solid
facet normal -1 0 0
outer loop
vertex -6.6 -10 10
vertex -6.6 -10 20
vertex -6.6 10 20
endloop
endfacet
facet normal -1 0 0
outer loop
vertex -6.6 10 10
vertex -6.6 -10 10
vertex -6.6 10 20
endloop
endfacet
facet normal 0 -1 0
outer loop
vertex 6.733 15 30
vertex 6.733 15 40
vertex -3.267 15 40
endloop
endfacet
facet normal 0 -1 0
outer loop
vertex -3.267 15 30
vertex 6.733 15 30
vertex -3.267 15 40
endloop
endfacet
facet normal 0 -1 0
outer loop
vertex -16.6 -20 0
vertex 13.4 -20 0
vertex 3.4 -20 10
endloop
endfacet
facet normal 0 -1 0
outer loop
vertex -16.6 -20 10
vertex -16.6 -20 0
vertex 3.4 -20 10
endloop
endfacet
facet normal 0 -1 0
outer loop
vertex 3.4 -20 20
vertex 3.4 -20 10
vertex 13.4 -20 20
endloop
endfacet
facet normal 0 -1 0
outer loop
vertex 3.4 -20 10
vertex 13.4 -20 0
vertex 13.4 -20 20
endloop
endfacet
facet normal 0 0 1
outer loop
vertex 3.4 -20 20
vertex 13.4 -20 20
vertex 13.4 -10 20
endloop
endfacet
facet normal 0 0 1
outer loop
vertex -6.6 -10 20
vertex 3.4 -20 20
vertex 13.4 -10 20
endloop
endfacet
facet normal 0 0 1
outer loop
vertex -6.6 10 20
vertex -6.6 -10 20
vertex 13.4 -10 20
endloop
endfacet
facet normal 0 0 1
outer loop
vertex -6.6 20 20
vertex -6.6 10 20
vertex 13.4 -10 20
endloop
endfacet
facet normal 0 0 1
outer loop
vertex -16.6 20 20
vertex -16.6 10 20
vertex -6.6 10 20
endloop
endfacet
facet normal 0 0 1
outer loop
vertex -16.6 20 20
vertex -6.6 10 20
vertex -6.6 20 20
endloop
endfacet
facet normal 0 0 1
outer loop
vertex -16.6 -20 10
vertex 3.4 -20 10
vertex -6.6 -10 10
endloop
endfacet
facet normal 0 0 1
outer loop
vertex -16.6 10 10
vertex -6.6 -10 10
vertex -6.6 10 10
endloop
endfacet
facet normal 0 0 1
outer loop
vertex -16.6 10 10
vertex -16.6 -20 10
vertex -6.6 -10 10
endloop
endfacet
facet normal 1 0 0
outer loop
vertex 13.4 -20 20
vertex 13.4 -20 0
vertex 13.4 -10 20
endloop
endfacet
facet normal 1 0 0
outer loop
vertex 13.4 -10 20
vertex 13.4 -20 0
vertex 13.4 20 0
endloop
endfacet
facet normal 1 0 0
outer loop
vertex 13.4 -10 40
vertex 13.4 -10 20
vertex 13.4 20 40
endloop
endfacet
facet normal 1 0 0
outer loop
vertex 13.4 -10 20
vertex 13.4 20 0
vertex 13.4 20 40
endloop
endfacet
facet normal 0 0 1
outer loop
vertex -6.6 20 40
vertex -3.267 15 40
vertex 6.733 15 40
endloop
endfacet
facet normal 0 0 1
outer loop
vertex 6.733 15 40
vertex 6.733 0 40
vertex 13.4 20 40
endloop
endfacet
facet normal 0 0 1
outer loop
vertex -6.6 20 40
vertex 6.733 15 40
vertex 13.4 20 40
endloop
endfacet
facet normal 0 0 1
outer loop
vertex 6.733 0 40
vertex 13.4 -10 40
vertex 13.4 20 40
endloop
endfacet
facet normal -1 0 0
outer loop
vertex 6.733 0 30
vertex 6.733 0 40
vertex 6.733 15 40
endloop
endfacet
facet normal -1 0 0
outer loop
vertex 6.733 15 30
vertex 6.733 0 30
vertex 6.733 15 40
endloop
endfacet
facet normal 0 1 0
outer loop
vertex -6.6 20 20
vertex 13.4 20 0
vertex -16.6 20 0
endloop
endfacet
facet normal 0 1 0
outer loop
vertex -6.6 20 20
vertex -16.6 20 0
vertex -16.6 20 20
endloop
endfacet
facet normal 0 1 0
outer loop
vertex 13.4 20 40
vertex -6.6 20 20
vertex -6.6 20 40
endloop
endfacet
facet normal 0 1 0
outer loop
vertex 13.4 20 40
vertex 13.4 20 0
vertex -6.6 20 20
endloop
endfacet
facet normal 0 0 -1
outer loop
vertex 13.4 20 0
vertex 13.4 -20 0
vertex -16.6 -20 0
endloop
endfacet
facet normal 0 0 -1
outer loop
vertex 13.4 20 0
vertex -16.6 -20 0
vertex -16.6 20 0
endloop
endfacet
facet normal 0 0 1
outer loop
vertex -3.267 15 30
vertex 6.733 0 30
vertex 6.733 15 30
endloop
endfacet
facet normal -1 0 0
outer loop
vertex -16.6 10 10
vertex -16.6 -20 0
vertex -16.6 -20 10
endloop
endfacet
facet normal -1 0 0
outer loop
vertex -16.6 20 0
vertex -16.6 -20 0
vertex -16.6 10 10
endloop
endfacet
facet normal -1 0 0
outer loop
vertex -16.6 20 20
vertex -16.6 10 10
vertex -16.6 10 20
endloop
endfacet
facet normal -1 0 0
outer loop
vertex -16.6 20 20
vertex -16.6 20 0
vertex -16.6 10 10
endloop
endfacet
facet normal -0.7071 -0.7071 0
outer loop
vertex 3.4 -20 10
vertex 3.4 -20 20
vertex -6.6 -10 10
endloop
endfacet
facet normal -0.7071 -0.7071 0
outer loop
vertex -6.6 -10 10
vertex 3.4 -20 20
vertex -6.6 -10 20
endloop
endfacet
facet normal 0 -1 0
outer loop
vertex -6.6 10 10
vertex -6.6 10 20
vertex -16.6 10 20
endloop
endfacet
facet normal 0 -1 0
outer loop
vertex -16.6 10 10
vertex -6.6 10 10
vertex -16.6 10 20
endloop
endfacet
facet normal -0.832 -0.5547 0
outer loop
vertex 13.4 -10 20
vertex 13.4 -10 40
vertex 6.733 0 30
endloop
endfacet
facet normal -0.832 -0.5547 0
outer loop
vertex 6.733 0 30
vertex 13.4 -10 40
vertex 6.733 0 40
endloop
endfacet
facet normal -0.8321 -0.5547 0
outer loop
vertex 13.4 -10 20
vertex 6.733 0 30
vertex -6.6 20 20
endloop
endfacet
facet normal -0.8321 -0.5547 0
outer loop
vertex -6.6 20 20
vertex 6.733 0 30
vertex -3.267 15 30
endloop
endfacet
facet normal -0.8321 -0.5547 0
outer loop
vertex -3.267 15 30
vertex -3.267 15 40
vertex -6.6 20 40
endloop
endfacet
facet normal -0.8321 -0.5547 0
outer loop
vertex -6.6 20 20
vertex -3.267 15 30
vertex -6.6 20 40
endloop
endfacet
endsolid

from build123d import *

# Parameters (mm, degrees)
F0_W     = 40
F0_H     = 40
F1_DEPTH = 30
F3_DEPTH = 20
F5_DEPTH = 10
F7_DEPTH = 10
F8_ANGLE = 90


with BuildPart() as f1:
    # F0 (on Top) → F1 (new body)
    with BuildSketch(Plane.XY):
        Rectangle(F0_W, F0_H)
    extrude(amount=F1_DEPTH)

    # F2 (on face) → F3 (cut)
    with BuildSketch(Plane.YZ.offset(20)):
        Polygon((20, 30), (-20, 30), (-20, 0), (-10, 0), (20, 20), align=None)
    extrude(amount=-F3_DEPTH, mode=Mode.SUBTRACT)

    # F4 (on face) → F5 (cut)
    with BuildSketch(Plane.YZ):
        Polygon((10, 30), (-20, 30), (-20, 10), (-10, 20), (10, 20), align=None)
    extrude(amount=-F5_DEPTH, mode=Mode.SUBTRACT)

    # F6 (on face) → F7 (cut)
    with BuildSketch(Plane.YZ.offset(20)):
        Polygon((15, 6.666667), (15, 16.666667), (0, 6.666667), align=None)
    extrude(amount=-F7_DEPTH, mode=Mode.SUBTRACT)


with BuildPart() as f1_1:
    # F8: moved
    add(f1.part.rotate(Axis((-20, 0, 0), (0, -1, 0)), F8_ANGLE))


with BuildPart() as f1_2:
    # F9: moved
    add(f1_1.part.moved(Location((33.4, 0, 0))))


solid = f1_2.part
